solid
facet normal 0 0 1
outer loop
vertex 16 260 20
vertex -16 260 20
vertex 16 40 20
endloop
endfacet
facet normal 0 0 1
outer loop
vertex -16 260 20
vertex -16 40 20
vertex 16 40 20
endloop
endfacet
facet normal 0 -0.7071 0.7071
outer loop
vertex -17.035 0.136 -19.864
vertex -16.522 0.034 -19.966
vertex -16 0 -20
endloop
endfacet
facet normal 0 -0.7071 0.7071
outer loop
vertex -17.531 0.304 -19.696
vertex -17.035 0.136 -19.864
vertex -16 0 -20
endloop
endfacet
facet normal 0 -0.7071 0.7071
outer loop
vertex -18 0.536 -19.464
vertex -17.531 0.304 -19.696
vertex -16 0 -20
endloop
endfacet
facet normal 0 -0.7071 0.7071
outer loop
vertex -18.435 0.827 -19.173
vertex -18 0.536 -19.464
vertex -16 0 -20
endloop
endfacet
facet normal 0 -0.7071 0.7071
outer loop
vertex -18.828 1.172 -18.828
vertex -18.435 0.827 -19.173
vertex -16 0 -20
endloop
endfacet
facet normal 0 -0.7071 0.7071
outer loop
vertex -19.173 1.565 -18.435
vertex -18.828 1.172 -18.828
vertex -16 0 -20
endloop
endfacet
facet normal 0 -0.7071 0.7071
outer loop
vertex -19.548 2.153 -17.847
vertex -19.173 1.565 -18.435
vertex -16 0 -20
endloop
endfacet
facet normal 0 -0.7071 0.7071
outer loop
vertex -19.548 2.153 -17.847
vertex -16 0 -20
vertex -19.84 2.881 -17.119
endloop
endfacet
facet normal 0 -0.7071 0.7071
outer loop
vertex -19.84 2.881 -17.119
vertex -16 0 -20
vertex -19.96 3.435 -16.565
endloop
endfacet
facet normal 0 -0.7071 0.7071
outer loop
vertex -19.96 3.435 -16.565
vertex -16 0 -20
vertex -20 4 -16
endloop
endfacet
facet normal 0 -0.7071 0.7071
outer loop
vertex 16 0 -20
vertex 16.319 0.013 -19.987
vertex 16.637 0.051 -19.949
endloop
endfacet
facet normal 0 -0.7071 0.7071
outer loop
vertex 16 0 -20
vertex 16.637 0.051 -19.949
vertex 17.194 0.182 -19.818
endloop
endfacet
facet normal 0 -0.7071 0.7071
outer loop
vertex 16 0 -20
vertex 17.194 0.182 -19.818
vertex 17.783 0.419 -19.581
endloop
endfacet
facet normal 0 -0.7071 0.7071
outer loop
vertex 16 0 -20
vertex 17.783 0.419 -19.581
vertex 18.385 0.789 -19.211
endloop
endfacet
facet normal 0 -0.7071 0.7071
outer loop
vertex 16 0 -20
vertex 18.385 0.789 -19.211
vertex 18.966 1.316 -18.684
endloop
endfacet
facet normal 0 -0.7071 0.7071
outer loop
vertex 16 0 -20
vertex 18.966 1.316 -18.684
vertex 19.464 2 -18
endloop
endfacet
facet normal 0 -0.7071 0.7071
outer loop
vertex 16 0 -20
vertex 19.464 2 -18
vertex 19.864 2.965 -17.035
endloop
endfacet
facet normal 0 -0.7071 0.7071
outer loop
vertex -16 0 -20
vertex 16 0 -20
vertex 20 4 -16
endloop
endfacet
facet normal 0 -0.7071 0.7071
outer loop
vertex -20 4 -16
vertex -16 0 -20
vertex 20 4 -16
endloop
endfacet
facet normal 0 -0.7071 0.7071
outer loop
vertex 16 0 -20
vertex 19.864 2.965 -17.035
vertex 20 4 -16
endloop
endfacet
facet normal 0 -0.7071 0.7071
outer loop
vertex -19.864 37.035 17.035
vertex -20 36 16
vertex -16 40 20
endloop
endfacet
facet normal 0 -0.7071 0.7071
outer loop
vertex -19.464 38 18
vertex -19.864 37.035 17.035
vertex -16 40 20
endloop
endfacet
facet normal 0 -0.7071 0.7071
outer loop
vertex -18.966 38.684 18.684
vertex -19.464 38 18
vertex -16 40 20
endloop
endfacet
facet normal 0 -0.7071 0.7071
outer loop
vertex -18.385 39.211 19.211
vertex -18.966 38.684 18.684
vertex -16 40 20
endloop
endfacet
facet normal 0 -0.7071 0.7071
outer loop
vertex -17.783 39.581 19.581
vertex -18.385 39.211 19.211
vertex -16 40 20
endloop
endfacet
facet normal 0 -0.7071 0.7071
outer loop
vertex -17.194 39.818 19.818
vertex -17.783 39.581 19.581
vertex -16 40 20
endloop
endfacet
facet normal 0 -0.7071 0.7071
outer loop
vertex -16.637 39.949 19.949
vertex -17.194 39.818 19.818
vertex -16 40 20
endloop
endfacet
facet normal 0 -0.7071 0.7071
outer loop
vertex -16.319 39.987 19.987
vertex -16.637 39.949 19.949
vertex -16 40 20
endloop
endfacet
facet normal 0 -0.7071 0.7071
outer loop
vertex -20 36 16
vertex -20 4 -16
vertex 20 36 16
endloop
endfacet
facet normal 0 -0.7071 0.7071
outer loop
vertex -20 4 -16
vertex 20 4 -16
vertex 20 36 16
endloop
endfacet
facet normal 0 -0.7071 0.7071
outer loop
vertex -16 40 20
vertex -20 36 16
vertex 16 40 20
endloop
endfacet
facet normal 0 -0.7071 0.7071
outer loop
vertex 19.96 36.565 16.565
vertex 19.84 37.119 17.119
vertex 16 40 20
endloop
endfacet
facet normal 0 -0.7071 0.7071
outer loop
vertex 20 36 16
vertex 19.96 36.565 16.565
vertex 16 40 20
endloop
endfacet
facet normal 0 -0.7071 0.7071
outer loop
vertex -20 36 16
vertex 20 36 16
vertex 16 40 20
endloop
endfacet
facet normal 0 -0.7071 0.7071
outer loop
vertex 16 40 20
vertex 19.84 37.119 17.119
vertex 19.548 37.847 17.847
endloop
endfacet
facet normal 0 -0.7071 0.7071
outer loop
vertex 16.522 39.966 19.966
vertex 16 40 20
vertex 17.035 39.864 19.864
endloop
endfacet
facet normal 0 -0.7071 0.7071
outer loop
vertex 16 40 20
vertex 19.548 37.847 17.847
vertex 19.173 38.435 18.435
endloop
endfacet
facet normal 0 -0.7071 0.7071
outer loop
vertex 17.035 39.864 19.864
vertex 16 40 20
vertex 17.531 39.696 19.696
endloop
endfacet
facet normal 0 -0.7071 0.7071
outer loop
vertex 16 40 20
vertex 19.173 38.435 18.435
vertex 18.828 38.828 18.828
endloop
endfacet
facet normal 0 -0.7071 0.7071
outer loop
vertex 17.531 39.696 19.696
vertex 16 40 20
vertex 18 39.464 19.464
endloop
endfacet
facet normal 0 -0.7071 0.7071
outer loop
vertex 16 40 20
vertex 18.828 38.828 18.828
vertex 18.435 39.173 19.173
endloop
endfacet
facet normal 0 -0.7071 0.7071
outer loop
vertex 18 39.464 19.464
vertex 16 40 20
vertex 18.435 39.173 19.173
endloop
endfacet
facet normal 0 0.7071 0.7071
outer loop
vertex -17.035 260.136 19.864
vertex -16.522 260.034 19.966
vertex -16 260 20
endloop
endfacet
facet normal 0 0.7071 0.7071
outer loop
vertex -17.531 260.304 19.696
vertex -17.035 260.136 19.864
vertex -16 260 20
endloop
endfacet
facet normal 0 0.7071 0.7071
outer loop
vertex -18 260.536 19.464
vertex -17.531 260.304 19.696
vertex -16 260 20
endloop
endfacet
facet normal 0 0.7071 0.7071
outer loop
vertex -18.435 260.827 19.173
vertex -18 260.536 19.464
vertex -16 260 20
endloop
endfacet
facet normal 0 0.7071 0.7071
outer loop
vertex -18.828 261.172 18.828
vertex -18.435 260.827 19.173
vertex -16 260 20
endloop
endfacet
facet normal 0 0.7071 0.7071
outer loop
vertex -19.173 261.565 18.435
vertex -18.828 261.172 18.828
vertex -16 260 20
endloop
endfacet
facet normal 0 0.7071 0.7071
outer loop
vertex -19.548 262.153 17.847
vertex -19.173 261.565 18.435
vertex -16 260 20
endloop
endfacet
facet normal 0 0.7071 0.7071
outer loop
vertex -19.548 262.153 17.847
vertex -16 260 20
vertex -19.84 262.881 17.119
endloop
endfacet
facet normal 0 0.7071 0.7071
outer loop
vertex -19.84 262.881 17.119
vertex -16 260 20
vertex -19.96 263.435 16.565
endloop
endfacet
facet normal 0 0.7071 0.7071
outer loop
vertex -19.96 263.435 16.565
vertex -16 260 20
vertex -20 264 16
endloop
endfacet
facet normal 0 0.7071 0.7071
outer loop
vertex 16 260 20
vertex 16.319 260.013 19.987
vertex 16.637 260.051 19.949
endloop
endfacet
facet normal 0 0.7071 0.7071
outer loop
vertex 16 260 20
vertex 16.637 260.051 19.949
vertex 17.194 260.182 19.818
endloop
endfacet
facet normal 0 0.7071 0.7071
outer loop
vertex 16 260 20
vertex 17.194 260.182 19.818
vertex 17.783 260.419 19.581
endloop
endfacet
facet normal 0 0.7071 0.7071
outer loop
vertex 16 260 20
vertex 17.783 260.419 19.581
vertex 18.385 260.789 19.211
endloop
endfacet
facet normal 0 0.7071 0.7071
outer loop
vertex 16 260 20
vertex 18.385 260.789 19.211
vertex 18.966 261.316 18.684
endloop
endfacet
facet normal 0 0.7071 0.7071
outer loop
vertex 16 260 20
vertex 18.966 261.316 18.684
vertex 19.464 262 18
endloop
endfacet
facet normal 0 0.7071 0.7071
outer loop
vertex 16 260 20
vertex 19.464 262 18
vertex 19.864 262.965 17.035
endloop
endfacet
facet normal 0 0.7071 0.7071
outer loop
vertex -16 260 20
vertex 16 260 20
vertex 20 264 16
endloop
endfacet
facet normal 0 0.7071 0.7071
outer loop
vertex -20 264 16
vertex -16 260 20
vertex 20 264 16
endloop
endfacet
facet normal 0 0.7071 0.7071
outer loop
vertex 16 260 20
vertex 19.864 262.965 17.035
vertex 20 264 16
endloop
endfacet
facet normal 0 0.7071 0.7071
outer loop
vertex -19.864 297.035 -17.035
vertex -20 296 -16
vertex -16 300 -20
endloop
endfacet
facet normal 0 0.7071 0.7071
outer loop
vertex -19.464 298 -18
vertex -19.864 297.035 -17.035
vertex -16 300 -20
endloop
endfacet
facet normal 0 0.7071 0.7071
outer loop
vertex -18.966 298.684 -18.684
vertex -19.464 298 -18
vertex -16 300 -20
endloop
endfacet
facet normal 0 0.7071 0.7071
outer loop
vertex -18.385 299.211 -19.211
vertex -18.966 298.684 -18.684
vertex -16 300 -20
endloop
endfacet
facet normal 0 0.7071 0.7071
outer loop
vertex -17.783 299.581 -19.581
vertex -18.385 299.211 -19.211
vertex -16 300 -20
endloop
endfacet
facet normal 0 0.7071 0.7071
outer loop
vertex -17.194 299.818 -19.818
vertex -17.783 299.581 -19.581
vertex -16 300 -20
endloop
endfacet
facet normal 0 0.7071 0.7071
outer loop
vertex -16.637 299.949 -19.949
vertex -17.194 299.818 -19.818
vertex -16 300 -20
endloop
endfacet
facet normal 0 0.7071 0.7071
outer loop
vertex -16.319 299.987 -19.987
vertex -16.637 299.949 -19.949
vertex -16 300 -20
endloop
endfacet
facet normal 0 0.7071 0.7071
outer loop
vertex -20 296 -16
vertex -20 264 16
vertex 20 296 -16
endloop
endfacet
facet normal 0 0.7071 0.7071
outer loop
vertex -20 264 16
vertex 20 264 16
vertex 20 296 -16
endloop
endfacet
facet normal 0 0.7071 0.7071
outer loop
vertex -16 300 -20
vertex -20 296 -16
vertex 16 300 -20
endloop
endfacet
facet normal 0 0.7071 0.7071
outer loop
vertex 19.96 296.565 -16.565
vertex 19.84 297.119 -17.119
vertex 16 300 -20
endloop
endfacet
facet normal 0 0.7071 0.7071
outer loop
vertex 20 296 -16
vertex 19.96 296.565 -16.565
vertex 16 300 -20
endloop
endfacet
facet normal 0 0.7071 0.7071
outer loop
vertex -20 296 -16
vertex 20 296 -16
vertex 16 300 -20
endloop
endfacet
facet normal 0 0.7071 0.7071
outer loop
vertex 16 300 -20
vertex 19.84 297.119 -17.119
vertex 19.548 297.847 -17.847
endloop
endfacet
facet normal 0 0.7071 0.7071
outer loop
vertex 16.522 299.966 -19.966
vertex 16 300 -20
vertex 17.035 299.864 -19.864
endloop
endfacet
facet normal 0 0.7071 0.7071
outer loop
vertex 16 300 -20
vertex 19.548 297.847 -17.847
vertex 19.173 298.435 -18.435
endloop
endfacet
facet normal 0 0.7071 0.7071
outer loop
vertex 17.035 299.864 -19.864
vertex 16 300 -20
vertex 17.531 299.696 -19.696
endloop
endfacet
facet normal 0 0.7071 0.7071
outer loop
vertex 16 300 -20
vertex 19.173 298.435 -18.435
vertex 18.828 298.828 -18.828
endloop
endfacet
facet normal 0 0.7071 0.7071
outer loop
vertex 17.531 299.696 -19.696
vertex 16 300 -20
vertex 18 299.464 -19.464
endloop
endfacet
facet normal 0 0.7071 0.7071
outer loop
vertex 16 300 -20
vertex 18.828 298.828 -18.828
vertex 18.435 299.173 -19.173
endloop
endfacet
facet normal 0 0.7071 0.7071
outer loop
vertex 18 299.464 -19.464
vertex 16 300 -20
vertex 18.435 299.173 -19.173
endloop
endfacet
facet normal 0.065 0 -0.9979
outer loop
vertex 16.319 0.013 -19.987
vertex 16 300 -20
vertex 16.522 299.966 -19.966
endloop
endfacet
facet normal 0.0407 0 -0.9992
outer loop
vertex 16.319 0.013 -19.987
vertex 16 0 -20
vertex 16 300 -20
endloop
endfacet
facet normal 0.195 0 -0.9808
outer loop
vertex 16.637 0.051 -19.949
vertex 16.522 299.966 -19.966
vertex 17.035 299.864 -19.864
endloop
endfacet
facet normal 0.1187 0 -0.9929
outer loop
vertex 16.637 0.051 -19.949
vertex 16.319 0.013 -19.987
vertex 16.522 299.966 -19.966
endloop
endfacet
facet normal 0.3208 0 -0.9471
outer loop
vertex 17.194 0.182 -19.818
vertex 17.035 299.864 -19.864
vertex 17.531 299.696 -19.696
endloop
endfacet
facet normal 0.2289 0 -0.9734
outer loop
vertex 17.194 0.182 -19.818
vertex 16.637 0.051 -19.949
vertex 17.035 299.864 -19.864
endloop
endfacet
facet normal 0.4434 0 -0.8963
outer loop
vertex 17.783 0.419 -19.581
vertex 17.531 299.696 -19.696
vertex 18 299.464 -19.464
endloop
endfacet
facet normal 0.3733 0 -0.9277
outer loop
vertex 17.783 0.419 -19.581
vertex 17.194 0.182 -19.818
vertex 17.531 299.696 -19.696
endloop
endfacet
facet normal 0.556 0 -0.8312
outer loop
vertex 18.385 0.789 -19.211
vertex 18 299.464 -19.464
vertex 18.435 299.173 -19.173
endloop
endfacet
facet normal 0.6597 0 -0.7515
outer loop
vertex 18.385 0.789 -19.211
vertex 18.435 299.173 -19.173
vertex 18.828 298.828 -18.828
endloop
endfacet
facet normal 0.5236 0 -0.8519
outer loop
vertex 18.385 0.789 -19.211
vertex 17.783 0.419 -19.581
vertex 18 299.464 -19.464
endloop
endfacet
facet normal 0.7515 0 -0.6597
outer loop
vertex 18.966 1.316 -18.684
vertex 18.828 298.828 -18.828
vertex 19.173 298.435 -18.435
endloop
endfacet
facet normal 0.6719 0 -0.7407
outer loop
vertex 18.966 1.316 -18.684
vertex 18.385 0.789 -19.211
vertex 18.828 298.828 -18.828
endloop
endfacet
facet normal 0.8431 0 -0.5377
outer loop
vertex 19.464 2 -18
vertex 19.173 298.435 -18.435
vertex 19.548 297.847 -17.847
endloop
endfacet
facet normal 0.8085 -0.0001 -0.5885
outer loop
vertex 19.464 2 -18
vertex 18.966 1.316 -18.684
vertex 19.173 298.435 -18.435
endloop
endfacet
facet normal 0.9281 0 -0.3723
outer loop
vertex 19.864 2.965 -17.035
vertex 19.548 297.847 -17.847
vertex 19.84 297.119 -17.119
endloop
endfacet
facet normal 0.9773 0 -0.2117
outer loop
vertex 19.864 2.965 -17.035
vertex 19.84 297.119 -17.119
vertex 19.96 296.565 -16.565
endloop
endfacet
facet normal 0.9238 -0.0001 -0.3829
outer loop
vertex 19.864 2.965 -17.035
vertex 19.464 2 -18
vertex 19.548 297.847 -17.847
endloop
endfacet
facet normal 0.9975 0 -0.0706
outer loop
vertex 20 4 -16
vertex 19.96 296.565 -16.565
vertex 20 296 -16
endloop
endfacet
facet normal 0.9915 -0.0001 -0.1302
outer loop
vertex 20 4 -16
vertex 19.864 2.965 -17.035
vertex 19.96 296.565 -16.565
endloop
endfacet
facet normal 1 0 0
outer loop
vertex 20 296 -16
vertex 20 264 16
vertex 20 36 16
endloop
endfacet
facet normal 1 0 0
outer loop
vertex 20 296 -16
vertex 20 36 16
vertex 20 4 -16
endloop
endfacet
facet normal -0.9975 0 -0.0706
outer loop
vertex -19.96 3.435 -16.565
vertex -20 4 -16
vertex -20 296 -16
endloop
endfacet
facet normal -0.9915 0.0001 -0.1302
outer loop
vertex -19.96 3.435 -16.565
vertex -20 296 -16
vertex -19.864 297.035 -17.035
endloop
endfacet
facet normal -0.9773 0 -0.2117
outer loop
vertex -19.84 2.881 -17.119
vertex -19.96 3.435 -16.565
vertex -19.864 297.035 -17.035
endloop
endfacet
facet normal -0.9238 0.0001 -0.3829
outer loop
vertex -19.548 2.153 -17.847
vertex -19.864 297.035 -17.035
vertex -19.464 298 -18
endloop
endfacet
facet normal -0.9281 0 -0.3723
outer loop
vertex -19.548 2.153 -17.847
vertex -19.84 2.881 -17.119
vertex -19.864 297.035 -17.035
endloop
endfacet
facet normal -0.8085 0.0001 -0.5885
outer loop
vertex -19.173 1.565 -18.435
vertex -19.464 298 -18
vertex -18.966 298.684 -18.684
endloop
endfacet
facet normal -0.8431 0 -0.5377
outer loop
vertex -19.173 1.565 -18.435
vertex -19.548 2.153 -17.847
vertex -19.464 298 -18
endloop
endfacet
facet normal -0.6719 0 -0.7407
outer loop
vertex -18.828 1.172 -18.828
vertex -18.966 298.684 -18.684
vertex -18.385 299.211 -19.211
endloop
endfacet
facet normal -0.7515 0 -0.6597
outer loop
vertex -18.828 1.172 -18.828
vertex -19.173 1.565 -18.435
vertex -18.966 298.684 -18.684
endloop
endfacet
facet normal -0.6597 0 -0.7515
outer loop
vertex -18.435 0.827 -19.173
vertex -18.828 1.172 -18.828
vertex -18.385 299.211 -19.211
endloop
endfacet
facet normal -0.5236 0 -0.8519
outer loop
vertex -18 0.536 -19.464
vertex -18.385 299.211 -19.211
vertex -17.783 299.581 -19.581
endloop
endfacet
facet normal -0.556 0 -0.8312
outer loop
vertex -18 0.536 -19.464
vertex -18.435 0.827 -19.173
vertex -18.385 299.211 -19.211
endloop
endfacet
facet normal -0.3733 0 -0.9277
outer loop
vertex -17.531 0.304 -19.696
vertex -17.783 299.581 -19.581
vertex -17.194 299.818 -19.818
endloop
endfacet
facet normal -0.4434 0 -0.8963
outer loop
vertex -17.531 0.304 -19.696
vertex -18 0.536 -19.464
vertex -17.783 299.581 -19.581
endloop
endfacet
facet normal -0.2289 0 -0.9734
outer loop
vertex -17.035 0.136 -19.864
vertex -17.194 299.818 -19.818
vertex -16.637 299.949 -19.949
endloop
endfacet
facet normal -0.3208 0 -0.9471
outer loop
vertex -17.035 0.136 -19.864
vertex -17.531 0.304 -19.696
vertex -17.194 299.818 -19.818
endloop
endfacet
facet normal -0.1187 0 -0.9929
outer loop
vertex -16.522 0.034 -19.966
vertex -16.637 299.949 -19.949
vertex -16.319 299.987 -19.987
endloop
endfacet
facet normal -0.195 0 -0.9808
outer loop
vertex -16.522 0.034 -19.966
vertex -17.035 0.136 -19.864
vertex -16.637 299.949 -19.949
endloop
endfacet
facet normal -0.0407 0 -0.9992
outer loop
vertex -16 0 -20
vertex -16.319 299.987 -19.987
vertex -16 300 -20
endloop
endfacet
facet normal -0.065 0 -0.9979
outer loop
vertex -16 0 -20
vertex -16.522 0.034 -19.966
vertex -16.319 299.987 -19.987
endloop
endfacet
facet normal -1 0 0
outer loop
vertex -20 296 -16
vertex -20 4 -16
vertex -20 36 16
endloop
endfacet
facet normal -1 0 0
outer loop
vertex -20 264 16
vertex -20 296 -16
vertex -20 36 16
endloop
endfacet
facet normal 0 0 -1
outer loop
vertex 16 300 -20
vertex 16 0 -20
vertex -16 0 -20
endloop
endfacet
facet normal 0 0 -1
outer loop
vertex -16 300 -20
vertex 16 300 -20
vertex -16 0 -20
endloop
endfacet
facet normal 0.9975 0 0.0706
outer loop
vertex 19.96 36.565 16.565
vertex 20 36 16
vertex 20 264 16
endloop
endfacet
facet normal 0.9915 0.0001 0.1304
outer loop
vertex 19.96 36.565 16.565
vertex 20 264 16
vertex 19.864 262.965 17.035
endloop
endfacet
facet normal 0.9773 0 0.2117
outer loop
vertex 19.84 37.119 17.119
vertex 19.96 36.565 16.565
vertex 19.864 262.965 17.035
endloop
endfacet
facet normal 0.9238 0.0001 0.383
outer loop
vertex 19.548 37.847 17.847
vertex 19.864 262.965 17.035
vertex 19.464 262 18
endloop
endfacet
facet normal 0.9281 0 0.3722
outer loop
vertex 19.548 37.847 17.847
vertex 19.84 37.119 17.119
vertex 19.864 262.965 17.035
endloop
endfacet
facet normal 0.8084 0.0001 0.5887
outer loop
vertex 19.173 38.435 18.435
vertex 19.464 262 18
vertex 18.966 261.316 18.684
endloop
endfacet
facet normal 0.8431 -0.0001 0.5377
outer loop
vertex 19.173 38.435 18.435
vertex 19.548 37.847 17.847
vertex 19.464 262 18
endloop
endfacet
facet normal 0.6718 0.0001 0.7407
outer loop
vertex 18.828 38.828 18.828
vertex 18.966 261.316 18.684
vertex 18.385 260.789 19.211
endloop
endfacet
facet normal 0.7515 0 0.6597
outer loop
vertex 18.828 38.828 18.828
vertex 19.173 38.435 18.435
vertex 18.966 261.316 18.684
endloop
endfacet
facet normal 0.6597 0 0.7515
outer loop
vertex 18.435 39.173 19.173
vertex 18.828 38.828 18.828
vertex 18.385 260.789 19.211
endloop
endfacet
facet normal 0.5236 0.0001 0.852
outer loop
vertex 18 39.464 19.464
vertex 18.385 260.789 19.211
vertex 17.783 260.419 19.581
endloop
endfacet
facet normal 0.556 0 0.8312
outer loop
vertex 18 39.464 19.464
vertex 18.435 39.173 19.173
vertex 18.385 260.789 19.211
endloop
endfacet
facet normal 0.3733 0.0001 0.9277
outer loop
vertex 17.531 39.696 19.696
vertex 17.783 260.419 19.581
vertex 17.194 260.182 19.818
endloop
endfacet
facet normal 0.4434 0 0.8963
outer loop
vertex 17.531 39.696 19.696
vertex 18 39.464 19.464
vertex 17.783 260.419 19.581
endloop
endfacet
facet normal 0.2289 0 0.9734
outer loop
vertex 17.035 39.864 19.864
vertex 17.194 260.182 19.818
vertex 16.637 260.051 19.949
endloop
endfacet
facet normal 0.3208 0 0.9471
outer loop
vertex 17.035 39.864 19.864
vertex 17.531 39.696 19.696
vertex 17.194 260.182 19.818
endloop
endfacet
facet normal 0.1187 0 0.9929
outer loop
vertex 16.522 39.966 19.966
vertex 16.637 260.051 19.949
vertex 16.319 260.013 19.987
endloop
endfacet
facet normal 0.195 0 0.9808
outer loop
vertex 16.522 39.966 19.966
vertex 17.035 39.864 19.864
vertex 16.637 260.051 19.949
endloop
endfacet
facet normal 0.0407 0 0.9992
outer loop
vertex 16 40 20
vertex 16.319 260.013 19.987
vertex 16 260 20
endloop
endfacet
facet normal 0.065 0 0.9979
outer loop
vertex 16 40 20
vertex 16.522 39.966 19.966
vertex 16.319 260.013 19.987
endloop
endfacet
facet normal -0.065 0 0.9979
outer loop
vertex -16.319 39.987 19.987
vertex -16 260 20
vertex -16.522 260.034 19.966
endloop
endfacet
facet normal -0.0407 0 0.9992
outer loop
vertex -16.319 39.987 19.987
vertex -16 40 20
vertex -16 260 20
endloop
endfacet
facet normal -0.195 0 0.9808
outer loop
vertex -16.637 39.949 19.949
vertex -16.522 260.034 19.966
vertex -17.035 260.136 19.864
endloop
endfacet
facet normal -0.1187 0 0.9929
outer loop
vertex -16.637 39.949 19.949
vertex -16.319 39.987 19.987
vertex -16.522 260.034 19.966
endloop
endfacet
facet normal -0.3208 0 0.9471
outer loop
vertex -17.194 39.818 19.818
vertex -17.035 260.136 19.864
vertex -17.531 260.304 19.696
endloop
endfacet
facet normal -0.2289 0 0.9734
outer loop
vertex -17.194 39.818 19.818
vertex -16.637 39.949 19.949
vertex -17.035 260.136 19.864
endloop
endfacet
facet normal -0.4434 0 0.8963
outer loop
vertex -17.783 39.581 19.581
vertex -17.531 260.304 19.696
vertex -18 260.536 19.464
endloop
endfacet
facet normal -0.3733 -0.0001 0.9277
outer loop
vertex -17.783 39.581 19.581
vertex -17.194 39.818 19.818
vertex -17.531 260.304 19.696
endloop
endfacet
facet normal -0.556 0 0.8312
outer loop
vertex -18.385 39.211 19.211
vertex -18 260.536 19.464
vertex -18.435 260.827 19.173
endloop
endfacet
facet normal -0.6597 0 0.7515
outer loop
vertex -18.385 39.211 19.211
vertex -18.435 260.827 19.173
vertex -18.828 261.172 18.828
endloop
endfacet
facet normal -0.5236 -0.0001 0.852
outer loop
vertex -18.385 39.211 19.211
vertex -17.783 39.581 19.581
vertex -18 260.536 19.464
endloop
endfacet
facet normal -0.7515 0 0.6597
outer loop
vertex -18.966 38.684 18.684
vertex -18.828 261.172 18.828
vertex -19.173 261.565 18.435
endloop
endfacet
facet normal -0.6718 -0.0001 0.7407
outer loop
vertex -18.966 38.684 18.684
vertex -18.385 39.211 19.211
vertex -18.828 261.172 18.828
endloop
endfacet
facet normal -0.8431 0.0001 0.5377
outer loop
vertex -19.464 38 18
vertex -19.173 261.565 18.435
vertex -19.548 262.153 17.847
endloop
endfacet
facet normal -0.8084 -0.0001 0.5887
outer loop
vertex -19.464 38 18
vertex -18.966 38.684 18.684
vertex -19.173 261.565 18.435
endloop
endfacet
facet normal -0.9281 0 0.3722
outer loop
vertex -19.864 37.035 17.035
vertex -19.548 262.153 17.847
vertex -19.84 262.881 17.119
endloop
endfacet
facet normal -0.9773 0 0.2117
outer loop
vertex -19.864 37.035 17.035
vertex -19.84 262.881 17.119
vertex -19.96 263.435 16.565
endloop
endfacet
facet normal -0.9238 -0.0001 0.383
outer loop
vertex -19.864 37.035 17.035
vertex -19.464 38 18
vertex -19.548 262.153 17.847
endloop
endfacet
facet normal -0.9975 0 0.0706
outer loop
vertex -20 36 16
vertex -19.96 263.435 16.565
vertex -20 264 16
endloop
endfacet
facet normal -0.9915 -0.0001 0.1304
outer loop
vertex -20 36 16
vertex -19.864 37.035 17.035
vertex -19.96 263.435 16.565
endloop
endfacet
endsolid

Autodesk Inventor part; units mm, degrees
ref_plane "YZ Plane" through (0, 0, 0) normal (1, 0, 0) x (0, 1, 0)
ref_plane "XZ Plane" through (0, 0, 0) normal (0, 1, 0) x (-1, 0, 0)
ref_plane "XY Plane" through (0, 0, 0) normal (0, 0, 1) x (1, 0, 0)
sketch "Sketch1" plane through (0, 0, 0) normal (0, 1, 0) x (-1, 0, 0)
  line L0 (0, 12.4728) -> (0, -12.4728) construction
  line L1 (2.135, 0) -> (-2.135, 0) construction
  line L2 (16, 20) -> (-16, 20)
  line L3 (-20, 16) -> (-20, -16)
  line L4 (-16, -20) -> (16, -20)
  line L5 (20, -16) -> (20, 16)
  arc A0 (-16, 20) -> (-20, 16) centre (-16, 16) ccw
  arc A1 (-20, -16) -> (-16, -20) centre (-16, -16) ccw
  arc A2 (16, -20) -> (20, -16) centre (16, -16) ccw
  arc A3 (20, 16) -> (16, 20) centre (16, 16) ccw
  point P0 (0, 0)
  point P1 (0, 0)
  dimension "d1" = 4
  dimension "d2" = 4
  dimension "d3" = 40
extrude "Extrusion1" add sketch "Sketch1" along normal blind 300
sketch "Sketch2" plane through (20, 0, 16) normal (1, 0, 0) x (0, 0, -1)
  line L0 (36, 0) -> (-4, 40)
  line L1 (-4, 40) -> (-4, 0)
  line L2 (-4, 0) -> (36, 0)
  line L3 (-4, 300) -> (-4, 260)
  line L4 (-4, 260) -> (36, 300)
  line L5 (36, 300) -> (-4, 300)
  line L6 (-4, 0) -> (-4, 300) projected
  line L7 (36, 0) -> (36, 300) projected
  point P0 (16, 0)
  dimension "d6" = 45
  dimension "d7" = 45
extrude "Extrusion2" cut sketch "Sketch2" against normal through all contours L2 L1 L0 | L4 L3 L5
properties part number "item40x40_1000"
